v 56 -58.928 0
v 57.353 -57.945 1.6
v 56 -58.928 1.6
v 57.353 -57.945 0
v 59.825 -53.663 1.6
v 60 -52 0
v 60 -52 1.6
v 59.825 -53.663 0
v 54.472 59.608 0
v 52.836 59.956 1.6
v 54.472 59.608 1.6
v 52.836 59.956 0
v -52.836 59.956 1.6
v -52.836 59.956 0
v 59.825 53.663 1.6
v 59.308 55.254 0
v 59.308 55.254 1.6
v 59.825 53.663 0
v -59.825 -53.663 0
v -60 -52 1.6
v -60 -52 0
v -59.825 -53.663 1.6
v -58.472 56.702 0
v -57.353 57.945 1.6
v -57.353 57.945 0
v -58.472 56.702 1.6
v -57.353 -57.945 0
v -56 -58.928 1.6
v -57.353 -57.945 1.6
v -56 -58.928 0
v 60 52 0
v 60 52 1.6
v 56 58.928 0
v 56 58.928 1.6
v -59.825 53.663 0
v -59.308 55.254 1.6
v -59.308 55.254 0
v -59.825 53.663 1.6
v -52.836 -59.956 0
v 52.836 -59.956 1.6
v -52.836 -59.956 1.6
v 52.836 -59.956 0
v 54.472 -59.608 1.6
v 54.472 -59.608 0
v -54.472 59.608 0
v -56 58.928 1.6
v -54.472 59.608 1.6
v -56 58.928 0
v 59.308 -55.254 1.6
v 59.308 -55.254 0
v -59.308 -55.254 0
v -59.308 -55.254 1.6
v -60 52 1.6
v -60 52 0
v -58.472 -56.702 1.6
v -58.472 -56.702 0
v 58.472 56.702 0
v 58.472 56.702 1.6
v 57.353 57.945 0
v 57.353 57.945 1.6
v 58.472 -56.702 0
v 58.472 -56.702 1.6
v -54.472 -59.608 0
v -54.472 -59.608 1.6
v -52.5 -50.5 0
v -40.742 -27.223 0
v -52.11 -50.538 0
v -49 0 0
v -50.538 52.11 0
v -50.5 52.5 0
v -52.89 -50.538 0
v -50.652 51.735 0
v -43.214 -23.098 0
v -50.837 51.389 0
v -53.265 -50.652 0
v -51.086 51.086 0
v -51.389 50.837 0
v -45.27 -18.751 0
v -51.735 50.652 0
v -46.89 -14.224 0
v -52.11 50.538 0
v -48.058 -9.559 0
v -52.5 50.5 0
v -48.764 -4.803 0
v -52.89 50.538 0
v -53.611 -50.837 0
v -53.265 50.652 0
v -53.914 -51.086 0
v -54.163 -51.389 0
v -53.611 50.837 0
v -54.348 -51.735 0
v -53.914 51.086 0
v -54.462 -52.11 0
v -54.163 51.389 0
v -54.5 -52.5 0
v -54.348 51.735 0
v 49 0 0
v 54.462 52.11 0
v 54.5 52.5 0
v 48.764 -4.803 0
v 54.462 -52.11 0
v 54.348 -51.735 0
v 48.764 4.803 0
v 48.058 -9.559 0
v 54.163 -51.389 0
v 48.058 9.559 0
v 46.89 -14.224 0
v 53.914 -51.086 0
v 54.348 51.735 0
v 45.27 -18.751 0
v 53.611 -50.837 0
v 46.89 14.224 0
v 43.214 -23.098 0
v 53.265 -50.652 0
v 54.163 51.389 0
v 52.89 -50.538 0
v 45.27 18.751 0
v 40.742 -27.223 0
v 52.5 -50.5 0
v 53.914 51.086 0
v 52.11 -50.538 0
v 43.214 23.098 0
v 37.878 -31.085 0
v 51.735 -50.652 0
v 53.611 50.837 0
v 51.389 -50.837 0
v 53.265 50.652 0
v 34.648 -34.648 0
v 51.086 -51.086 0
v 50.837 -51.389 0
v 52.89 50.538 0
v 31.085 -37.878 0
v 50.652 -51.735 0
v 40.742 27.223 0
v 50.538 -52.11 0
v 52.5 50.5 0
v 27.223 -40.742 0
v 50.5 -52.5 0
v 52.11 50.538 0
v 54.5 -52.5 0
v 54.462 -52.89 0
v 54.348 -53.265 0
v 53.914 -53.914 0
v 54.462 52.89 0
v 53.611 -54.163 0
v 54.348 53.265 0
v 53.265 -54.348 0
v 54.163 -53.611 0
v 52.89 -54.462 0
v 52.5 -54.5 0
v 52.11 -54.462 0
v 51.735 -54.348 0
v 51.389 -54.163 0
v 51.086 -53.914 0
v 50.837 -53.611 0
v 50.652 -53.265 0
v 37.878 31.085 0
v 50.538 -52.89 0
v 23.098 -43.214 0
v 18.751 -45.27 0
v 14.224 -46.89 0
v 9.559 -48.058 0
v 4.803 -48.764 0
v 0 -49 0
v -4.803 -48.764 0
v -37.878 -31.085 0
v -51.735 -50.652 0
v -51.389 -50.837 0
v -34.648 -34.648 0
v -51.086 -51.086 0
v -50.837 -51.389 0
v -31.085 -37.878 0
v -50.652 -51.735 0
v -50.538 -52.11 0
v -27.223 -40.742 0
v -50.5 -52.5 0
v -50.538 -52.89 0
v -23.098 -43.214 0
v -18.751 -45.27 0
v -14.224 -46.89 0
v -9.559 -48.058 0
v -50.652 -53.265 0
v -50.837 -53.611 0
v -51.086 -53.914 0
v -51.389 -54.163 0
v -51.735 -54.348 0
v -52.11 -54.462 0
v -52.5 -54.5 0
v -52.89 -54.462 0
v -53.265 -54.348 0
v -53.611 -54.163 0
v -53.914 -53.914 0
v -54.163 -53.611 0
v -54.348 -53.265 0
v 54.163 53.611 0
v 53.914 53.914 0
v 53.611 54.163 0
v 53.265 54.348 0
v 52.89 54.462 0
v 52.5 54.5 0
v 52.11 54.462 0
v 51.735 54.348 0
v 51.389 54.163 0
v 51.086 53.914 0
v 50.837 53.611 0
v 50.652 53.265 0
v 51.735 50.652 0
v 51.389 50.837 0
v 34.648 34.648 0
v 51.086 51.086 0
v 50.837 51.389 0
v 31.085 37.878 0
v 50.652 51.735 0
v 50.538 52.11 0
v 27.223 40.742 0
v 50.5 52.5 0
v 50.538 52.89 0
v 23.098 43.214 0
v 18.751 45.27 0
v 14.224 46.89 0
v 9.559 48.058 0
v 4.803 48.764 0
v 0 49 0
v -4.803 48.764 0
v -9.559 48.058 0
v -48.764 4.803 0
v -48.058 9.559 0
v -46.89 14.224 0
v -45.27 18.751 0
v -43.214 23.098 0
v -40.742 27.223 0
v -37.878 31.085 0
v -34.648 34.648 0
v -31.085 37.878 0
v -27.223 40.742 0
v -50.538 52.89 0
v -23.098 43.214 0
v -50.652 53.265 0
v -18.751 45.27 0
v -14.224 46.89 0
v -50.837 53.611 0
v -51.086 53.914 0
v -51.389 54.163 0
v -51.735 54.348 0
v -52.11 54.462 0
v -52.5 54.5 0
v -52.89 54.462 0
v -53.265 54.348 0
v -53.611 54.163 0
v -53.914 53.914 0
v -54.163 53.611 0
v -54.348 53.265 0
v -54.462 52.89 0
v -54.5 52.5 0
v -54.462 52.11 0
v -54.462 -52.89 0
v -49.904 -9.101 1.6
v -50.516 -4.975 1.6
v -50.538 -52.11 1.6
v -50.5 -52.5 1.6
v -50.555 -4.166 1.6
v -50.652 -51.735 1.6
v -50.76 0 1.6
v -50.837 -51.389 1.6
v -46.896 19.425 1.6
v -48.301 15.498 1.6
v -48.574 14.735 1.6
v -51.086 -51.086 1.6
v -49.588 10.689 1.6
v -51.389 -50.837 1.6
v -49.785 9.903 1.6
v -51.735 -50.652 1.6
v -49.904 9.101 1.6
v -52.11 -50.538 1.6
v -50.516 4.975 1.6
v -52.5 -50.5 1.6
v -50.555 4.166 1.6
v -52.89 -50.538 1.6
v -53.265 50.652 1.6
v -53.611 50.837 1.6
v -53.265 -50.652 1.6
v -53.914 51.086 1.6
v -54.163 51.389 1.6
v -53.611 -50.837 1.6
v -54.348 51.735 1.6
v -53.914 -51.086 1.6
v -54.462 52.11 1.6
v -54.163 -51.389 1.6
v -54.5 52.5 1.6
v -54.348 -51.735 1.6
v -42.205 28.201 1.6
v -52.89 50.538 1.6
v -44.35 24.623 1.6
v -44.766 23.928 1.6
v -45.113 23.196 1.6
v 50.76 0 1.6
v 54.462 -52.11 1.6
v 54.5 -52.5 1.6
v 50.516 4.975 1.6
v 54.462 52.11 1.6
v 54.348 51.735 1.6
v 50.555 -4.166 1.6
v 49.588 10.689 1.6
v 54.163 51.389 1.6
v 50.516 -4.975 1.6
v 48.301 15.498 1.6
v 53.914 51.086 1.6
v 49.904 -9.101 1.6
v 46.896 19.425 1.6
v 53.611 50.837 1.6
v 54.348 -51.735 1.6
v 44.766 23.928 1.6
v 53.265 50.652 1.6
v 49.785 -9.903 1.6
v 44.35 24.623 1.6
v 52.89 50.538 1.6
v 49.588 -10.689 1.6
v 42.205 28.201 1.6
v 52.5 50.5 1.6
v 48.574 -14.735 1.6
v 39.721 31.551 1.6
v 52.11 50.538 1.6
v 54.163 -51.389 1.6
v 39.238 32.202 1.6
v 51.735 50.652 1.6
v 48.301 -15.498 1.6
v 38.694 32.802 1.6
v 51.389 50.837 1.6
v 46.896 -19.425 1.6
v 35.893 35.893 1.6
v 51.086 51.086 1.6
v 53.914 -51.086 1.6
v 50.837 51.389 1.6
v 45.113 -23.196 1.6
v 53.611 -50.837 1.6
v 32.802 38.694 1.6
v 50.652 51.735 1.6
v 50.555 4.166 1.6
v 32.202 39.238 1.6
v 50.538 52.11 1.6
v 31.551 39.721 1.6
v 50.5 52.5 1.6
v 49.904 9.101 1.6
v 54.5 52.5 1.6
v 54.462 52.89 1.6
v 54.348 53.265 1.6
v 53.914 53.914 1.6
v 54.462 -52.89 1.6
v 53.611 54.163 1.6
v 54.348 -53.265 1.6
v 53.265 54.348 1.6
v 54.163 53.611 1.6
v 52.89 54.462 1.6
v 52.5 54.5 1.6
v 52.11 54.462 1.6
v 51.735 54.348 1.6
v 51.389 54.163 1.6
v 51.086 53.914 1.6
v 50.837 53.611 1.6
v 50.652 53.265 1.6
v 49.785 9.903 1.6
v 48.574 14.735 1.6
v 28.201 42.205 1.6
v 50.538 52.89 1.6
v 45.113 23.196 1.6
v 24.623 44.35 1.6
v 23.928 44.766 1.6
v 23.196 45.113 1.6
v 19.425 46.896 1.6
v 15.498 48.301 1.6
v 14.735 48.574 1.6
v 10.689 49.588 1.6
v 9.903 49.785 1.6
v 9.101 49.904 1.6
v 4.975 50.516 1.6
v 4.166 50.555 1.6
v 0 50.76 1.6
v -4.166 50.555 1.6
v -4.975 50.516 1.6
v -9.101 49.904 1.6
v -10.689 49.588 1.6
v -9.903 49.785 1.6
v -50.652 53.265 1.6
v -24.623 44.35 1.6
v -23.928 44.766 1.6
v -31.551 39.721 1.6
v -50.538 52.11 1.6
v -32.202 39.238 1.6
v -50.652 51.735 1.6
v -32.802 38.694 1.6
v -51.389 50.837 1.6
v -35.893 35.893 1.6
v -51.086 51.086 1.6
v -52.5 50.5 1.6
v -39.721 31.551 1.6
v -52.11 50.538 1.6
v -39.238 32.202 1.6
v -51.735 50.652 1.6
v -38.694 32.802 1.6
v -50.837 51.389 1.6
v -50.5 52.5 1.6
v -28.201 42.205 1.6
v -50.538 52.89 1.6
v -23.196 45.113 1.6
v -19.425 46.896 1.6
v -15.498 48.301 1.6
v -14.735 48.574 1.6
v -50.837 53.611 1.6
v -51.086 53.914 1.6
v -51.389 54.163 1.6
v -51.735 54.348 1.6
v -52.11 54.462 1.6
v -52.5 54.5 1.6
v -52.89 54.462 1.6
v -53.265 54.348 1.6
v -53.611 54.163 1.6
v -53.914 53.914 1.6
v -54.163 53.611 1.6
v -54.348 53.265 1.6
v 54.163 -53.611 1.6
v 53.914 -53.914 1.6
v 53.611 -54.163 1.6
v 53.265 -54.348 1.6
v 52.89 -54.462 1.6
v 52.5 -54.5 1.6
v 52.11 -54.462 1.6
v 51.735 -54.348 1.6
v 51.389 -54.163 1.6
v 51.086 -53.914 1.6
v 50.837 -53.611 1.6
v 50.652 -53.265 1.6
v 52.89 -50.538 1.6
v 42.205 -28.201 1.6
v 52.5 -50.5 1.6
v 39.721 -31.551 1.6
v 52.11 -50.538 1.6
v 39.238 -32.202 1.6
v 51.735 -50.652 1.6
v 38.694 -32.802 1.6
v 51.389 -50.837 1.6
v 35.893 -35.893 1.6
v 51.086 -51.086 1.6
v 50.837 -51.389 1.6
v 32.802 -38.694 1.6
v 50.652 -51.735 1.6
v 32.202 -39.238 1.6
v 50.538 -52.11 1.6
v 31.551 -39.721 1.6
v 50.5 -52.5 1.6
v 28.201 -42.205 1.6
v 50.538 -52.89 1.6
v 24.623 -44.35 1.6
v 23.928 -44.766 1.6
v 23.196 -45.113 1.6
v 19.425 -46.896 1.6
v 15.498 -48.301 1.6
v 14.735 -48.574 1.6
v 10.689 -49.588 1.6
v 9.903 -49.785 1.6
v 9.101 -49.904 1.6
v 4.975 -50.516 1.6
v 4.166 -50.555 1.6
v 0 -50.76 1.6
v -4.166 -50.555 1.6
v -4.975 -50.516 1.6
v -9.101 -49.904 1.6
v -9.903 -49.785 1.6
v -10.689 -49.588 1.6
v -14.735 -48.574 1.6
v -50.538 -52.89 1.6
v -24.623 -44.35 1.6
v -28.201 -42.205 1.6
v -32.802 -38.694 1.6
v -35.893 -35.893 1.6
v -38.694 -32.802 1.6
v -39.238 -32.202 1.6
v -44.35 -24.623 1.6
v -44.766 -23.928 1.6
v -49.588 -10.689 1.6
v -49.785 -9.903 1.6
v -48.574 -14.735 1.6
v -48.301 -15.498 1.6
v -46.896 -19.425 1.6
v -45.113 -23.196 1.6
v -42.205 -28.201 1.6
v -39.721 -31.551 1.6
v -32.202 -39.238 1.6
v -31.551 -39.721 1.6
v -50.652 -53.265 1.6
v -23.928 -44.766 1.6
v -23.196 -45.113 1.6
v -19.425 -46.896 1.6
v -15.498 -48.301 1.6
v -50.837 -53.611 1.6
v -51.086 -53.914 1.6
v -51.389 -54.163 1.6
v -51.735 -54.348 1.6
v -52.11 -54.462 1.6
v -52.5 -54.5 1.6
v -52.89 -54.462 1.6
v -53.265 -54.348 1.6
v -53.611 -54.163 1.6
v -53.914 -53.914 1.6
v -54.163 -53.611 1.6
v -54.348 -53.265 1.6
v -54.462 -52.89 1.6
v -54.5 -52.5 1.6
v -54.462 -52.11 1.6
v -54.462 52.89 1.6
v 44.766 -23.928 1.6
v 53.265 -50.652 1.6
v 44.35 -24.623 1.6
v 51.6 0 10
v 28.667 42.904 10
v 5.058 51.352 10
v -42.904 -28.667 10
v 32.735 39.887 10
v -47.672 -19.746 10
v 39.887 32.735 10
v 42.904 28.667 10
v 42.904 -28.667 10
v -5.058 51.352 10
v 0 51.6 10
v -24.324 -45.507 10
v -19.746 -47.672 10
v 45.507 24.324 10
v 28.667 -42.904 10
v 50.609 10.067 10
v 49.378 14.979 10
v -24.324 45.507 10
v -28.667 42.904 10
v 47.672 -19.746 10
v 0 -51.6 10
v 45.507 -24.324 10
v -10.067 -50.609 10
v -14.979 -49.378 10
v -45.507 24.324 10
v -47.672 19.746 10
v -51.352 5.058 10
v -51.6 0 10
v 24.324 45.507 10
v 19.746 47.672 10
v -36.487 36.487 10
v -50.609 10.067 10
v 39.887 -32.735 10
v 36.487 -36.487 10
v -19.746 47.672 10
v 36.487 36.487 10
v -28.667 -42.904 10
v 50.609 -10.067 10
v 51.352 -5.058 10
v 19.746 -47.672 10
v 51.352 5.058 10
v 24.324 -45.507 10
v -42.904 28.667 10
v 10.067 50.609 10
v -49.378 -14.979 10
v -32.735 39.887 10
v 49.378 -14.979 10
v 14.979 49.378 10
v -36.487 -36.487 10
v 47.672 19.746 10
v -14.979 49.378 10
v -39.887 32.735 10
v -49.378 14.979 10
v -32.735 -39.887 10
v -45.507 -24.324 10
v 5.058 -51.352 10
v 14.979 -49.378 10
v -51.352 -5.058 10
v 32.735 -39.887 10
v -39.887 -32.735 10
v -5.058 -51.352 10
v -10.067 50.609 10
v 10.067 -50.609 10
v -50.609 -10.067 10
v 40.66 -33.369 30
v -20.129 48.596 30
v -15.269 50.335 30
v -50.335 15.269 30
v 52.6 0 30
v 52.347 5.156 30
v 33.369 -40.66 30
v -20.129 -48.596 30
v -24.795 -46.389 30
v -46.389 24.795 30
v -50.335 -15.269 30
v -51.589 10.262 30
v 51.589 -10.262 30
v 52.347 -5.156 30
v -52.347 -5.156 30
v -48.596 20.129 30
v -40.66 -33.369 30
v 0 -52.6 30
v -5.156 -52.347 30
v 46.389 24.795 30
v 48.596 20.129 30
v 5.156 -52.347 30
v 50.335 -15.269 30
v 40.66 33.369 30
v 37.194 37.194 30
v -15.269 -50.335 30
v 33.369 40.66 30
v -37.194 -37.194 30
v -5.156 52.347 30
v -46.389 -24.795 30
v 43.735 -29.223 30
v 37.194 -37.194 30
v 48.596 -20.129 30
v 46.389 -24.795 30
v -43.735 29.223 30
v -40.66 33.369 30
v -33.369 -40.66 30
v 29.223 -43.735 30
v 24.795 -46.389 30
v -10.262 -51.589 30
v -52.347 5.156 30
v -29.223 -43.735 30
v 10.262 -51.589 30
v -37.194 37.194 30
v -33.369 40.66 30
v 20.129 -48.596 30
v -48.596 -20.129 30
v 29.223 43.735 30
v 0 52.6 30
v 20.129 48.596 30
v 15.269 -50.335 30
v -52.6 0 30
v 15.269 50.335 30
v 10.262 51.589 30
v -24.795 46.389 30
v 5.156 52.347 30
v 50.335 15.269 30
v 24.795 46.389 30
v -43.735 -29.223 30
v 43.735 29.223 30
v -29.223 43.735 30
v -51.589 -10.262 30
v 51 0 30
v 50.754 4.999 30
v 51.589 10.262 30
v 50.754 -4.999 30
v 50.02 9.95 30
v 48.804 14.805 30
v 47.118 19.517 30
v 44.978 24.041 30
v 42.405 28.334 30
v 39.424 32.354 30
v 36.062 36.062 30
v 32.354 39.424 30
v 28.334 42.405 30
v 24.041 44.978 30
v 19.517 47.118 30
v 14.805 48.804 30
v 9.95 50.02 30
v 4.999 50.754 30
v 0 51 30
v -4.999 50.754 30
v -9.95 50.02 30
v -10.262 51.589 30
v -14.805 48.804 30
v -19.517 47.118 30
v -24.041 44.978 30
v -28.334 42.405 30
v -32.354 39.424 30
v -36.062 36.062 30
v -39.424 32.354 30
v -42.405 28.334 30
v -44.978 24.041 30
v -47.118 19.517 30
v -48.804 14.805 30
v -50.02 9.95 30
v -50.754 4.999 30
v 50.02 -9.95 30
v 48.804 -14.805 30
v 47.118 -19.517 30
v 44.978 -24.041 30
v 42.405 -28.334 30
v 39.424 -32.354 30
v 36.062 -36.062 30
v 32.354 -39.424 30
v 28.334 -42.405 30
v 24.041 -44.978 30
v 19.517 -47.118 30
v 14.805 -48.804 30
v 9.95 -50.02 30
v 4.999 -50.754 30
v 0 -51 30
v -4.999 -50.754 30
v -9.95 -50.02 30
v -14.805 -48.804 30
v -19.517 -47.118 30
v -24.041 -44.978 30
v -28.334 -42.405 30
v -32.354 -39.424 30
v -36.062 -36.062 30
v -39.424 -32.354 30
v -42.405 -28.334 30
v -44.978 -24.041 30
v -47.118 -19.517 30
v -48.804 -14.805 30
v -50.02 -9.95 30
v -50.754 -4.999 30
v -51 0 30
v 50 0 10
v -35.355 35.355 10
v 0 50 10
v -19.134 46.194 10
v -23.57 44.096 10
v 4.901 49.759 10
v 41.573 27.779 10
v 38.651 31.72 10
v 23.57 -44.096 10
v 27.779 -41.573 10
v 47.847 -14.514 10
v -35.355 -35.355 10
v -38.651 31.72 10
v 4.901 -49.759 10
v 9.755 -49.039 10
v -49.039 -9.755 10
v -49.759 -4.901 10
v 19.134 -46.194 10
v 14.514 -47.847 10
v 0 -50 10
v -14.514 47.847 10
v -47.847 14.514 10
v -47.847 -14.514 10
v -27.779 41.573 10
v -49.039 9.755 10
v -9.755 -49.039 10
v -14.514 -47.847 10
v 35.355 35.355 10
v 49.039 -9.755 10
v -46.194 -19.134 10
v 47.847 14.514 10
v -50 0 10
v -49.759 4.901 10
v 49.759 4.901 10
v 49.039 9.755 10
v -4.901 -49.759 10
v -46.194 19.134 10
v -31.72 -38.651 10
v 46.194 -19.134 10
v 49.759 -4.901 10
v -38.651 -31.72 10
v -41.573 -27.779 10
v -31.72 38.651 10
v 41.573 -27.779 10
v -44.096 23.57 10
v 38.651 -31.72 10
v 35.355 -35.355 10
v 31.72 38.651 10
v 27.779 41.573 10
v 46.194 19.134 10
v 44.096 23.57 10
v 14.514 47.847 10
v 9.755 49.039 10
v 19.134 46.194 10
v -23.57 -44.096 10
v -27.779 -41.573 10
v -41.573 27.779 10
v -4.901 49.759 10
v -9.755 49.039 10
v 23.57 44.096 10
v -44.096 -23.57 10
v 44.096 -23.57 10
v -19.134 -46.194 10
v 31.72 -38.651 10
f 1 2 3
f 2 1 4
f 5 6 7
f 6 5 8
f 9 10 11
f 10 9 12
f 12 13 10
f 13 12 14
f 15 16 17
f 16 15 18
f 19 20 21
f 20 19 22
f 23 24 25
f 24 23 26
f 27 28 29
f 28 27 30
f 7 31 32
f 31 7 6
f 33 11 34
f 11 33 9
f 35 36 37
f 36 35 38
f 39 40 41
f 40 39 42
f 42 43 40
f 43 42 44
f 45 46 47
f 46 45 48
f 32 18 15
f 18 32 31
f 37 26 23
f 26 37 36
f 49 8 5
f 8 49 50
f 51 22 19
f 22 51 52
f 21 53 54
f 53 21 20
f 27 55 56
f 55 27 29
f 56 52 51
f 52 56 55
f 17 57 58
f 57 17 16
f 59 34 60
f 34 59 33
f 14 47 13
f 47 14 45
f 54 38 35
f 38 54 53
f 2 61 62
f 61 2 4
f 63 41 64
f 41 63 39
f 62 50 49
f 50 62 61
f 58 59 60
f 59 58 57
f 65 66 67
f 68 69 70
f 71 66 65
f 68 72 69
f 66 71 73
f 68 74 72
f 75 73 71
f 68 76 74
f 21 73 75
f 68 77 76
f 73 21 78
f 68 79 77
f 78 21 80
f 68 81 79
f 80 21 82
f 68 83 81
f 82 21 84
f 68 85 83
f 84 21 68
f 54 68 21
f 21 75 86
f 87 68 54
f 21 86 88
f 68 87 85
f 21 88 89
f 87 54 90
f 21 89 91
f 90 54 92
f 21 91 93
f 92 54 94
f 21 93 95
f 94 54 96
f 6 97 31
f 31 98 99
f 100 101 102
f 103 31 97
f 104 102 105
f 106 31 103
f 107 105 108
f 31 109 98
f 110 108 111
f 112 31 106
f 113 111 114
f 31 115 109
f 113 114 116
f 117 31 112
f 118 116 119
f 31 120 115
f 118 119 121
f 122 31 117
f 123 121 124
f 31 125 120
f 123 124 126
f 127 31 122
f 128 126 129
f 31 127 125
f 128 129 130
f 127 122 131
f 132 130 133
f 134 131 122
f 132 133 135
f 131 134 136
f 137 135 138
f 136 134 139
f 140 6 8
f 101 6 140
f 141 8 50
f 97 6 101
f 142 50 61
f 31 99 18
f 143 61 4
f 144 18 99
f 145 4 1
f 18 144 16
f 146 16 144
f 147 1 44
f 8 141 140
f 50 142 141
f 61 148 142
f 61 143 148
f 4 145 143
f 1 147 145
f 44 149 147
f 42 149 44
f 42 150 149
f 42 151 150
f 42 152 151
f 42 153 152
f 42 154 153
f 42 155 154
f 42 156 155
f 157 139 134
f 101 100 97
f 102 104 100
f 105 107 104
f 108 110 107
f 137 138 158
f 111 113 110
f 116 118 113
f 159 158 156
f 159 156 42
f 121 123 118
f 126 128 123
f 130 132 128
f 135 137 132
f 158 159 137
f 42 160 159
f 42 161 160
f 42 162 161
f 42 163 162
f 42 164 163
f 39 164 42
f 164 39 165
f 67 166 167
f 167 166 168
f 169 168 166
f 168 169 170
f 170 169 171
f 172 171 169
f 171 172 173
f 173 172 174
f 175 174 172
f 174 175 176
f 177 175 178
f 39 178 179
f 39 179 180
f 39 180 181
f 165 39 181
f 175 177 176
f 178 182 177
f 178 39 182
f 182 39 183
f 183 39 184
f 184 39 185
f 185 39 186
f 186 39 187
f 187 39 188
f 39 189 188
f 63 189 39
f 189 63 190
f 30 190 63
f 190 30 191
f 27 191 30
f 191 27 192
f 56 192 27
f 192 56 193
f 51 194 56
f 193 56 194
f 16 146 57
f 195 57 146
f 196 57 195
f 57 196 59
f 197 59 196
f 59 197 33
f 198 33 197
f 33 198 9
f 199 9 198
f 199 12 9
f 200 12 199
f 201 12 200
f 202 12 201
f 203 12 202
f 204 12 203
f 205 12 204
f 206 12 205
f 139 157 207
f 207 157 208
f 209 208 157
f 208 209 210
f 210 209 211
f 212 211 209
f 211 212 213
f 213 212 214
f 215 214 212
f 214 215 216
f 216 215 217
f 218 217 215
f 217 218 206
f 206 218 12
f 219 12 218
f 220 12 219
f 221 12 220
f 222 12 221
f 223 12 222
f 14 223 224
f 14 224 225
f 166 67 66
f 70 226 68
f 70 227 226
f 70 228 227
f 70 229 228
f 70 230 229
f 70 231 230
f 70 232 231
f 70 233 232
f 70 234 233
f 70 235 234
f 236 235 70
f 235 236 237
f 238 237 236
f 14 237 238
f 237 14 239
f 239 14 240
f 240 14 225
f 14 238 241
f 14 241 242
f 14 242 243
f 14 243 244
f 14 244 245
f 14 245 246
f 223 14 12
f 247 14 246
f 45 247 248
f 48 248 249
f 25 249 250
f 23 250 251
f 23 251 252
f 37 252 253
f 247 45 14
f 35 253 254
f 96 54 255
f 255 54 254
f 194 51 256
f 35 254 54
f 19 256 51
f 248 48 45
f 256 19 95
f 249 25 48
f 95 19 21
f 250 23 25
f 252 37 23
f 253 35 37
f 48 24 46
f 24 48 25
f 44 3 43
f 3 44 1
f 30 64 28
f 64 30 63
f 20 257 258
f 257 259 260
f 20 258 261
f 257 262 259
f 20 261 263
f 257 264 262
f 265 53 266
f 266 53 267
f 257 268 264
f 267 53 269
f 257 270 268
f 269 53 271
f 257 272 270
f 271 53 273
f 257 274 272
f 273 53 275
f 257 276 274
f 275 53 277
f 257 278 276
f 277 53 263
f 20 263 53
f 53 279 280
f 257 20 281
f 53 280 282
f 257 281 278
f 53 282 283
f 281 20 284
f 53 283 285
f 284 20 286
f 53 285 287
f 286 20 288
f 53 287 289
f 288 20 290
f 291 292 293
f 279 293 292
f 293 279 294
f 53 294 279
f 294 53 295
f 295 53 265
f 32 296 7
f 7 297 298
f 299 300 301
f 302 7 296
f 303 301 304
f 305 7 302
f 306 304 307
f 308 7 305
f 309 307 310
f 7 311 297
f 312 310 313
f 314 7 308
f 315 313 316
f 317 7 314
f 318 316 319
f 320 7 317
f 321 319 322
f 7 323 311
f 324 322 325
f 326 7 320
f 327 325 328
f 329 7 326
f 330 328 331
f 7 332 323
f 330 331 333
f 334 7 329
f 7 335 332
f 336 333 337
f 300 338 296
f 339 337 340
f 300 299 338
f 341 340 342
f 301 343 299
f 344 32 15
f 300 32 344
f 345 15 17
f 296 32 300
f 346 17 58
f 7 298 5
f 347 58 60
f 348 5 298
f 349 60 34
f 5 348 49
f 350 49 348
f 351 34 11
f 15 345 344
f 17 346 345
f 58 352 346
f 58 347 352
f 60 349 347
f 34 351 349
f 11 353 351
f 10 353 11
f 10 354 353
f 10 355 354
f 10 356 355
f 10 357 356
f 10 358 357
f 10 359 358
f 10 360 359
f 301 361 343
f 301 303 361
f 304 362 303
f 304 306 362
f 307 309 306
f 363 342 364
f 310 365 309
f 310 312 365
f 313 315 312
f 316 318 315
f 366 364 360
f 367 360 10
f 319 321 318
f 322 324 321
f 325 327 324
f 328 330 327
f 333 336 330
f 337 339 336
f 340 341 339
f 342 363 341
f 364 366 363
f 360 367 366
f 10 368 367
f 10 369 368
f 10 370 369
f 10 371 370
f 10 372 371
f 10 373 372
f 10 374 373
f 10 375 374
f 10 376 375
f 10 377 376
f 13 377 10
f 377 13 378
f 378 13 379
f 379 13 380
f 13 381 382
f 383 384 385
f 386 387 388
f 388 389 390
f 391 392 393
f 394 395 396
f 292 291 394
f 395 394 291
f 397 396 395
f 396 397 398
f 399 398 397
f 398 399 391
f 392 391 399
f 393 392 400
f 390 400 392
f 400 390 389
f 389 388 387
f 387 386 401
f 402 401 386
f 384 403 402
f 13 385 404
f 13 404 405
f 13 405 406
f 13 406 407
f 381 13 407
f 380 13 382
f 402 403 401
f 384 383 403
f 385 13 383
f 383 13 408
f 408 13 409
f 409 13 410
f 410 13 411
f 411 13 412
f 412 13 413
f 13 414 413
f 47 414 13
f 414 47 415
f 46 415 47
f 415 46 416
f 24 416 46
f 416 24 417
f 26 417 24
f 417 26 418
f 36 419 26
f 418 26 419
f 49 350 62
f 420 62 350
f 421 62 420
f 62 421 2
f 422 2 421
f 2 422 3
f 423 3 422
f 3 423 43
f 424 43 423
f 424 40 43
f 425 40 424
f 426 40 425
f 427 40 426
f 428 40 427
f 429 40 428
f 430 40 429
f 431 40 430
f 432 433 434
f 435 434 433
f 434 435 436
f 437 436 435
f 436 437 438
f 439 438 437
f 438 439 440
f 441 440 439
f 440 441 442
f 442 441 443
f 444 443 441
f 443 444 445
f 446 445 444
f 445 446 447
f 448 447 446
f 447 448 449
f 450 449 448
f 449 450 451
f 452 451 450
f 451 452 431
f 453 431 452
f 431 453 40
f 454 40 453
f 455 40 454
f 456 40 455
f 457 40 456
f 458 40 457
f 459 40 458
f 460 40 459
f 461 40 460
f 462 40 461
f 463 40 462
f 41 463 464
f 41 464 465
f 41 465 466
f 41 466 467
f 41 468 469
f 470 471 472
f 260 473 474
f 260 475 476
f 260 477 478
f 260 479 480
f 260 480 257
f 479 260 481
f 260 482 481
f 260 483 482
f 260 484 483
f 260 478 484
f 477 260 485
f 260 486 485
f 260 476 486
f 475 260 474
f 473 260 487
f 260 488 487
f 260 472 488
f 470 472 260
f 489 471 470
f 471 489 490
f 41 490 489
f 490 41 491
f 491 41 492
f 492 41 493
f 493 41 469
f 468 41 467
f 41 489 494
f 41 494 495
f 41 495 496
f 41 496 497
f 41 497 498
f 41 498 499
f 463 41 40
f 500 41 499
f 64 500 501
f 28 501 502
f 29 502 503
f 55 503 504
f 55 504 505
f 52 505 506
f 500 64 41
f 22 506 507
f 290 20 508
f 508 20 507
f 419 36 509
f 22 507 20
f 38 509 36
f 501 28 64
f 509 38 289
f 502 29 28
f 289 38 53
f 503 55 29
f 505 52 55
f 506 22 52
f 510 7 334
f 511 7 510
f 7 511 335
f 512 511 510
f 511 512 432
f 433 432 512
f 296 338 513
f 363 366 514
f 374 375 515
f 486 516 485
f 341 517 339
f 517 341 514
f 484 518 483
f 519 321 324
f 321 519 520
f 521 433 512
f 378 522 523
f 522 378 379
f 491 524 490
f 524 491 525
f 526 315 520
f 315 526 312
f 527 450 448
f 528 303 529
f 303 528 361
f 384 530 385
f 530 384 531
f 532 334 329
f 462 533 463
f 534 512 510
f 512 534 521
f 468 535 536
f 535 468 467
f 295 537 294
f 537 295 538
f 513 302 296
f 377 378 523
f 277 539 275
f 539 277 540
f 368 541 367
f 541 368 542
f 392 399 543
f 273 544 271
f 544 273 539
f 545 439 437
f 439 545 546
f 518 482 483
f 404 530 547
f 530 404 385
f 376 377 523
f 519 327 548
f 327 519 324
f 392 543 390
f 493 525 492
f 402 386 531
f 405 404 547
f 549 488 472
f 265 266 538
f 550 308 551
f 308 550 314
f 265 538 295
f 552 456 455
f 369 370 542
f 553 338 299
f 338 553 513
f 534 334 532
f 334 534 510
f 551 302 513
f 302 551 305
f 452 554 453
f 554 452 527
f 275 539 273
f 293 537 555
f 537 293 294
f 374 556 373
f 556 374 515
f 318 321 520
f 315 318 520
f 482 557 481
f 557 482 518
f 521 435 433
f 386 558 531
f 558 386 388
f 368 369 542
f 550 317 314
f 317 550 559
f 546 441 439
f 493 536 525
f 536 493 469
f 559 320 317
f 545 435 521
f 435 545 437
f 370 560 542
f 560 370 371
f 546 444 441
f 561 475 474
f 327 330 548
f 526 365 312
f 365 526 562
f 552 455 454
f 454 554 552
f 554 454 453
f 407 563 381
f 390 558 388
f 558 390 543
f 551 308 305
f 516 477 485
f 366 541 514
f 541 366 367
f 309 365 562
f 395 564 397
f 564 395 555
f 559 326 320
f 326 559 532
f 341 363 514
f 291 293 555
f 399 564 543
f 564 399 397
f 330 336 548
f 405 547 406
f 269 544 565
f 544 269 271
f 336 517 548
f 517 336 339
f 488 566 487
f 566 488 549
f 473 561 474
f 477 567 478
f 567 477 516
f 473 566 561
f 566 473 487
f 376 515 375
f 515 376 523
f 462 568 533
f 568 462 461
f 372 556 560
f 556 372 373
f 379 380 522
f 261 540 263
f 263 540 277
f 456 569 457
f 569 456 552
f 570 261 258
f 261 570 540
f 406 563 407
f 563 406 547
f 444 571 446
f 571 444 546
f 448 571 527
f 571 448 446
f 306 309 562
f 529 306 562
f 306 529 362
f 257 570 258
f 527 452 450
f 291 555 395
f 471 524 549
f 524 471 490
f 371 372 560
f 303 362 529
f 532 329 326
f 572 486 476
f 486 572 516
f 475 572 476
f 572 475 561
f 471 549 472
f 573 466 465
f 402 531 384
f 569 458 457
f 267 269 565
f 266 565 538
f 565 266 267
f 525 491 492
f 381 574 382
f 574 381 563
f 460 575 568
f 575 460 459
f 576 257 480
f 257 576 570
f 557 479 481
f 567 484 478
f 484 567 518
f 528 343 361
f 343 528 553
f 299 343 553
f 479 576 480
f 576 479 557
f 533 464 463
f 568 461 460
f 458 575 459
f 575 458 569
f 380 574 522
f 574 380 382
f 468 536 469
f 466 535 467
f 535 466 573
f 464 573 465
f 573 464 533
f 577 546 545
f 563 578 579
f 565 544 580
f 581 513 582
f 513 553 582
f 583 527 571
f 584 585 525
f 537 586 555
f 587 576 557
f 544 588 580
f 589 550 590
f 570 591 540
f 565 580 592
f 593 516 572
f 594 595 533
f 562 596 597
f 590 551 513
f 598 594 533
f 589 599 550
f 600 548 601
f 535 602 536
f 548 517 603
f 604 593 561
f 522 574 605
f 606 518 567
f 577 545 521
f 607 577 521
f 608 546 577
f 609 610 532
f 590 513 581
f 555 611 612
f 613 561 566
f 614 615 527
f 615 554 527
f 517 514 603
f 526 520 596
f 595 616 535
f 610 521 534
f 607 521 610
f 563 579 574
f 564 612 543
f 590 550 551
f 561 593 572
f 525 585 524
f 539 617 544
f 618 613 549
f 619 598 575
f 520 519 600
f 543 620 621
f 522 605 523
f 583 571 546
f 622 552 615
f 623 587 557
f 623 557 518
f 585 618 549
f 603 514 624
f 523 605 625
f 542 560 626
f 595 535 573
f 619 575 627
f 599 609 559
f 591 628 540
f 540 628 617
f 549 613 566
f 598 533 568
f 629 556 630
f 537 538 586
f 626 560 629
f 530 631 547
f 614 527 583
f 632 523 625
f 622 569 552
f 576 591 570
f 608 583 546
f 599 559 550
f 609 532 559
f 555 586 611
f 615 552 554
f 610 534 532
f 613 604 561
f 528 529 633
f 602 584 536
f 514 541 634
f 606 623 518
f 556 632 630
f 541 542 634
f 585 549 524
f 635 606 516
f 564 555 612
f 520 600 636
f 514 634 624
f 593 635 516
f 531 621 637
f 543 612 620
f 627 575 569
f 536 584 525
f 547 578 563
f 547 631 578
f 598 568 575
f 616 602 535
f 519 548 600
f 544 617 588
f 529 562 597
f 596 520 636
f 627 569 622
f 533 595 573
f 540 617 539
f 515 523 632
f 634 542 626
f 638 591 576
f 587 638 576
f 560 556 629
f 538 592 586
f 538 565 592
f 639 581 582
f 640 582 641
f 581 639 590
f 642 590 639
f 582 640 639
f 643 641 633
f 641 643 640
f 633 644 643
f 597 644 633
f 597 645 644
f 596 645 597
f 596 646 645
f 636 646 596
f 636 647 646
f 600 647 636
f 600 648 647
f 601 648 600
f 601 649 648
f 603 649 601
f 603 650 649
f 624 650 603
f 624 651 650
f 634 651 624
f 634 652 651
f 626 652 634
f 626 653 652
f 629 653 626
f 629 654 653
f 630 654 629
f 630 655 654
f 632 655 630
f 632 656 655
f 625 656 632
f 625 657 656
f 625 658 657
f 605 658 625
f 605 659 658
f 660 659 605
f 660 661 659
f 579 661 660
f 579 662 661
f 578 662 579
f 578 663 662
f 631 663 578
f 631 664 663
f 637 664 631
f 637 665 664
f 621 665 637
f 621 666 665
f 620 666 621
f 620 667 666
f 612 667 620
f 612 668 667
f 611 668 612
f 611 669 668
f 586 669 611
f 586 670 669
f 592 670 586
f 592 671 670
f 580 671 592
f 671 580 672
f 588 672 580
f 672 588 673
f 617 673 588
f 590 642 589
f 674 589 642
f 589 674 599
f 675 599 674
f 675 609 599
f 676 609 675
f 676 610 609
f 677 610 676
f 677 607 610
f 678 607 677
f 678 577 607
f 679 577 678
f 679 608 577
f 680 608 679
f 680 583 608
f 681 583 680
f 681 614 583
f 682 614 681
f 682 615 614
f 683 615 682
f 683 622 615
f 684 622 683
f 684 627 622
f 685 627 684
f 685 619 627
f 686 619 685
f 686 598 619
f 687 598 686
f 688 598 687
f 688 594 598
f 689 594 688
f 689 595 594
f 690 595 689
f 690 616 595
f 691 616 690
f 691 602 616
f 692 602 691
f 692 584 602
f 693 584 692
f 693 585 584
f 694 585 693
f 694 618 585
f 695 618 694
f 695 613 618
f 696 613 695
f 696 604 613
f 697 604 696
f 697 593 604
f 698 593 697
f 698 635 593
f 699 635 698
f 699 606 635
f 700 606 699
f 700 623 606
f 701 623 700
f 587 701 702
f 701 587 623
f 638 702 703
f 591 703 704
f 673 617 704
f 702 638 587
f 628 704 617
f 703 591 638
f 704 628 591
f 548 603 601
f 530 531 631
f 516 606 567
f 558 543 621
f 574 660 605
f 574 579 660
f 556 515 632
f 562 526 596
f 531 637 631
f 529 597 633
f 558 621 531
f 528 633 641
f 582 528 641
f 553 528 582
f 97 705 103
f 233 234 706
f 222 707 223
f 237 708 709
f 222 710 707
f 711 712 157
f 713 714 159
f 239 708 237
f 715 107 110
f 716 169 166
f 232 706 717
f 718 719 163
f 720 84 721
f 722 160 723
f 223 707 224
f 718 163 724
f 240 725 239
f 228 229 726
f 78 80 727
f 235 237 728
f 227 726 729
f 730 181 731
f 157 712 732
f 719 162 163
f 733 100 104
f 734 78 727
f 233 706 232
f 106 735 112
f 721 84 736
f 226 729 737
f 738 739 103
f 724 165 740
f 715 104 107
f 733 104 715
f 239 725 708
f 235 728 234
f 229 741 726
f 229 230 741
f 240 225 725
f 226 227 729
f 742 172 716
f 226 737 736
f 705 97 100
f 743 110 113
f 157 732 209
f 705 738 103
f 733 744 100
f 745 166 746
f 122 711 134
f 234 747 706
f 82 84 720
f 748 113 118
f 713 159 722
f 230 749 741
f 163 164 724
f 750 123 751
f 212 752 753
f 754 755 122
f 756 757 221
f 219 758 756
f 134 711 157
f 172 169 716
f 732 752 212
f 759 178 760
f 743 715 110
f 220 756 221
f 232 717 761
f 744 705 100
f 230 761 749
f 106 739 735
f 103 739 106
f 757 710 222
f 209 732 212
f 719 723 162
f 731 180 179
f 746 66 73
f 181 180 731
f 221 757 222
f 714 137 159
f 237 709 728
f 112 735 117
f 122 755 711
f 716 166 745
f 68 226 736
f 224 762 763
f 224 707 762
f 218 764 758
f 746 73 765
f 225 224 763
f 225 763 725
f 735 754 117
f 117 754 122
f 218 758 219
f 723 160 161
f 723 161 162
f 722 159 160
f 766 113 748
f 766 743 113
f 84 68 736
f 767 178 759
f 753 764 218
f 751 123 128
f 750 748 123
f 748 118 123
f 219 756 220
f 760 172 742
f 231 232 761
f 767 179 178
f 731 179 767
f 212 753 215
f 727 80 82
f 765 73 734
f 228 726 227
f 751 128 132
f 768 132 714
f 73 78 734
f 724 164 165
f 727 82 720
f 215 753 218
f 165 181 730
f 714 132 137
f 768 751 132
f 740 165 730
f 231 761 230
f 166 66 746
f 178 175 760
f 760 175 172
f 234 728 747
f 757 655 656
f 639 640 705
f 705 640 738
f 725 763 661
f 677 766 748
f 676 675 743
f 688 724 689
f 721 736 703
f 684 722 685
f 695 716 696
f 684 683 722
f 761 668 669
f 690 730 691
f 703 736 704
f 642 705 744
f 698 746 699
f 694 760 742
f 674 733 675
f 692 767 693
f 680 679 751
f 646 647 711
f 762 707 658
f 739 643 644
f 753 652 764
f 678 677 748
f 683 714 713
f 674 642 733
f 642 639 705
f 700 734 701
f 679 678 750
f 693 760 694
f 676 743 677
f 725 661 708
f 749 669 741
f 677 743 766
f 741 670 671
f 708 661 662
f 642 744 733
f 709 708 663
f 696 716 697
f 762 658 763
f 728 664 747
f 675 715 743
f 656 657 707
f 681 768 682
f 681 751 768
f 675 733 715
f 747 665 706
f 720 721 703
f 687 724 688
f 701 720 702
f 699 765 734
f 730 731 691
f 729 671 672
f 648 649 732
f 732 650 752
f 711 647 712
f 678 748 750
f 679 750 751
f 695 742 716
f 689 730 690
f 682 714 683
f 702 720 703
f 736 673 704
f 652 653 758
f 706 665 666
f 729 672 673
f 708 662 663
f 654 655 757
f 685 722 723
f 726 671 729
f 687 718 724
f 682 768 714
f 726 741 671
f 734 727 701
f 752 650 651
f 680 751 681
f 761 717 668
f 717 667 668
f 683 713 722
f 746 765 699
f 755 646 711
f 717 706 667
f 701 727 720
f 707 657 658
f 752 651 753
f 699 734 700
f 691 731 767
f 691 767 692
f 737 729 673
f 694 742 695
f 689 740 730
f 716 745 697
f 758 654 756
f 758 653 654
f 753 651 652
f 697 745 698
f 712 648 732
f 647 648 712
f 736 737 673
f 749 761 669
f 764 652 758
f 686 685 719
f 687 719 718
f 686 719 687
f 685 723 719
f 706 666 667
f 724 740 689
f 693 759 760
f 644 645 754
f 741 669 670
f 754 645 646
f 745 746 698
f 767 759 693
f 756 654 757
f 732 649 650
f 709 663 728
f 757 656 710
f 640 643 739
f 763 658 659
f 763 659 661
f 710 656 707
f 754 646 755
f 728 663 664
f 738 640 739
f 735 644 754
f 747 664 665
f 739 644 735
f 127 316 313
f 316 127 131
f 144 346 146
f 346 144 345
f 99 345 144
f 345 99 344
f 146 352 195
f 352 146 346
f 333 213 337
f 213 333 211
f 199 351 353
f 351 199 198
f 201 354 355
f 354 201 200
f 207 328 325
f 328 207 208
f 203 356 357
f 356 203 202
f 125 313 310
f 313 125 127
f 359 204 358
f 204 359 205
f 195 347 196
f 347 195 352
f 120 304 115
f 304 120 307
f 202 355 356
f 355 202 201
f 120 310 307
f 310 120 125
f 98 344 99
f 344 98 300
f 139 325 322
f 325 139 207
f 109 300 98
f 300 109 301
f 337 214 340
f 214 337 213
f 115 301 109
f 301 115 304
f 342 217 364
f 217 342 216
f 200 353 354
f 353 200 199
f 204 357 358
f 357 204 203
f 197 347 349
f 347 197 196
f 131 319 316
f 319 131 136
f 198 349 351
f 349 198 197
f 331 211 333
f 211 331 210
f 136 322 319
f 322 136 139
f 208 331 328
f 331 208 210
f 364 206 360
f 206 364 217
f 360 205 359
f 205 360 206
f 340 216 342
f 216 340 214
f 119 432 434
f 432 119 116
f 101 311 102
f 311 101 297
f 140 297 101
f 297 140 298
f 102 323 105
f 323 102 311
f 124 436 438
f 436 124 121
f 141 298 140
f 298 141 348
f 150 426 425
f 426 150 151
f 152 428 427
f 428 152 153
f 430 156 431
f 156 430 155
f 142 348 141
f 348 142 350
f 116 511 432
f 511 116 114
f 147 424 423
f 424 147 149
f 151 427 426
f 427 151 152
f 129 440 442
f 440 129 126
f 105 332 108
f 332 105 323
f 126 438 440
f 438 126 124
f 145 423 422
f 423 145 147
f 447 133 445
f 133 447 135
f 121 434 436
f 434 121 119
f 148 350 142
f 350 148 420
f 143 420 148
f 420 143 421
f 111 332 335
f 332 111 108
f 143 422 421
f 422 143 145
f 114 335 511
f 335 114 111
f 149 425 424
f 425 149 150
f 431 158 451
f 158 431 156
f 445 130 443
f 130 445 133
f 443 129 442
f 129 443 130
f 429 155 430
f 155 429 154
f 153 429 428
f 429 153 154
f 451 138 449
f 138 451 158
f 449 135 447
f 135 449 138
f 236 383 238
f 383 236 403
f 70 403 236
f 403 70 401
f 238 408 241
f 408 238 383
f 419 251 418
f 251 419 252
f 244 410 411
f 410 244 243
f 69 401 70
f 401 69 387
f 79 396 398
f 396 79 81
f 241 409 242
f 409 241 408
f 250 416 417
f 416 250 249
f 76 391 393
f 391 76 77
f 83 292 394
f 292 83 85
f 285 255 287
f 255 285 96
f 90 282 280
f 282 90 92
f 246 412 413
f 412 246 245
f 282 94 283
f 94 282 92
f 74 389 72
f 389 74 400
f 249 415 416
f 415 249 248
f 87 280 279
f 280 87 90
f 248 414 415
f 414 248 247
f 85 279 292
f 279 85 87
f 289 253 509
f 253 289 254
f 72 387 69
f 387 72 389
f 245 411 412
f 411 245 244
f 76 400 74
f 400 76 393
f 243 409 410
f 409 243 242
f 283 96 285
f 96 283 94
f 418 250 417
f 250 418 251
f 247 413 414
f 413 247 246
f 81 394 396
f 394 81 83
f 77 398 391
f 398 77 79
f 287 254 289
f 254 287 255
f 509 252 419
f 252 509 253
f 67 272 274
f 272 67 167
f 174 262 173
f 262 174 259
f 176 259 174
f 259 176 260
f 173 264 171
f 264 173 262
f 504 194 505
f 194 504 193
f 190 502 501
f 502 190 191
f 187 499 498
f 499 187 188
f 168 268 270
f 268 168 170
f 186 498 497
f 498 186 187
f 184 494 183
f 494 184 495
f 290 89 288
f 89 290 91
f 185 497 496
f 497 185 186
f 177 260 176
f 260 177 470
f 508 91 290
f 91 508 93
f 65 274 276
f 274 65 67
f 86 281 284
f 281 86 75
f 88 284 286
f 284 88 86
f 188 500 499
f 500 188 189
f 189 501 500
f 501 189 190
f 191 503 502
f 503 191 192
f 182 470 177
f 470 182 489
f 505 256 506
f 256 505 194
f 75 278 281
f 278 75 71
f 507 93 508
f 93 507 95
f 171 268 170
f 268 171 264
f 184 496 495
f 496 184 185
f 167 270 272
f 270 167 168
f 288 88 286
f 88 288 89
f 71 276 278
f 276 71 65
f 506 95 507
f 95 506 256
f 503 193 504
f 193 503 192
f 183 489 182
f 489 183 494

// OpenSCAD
screw_d = 105;

screw_hole = 4;
wall = 0.8*2;
begin_d = 98+wall*2;
end_d = 100+wall*2;
end2_d = 102+wall*2;


h_1 = 10;
h_2 = 20;
fn = 64;

module roundedcube(xdim ,ydim ,zdim,rdim){
    hull(){
        fn=30;
        translate([rdim,rdim,0]) cylinder(r=rdim, h=zdim, $fn=fn);
        translate([xdim-rdim,rdim,0])cylinder(r=rdim, h=zdim, $fn=fn);

        translate([rdim,ydim-rdim,0]) cylinder(r=rdim, h=zdim, $fn=fn);
        translate([xdim-rdim,ydim-rdim,0]) cylinder(r=rdim, h=zdim, $fn=fn);
    }
}


difference() {
    union() {
        translate([-60,-60,0]) roundedcube(120,120,0.8*2,8);
        cylinder(d1=begin_d, d2=end_d, h=h_1, $fn = fn);
        
        translate([0,0,h_1]) cylinder(d1=end_d, d2=end2_d, h = h_2, $fn = fn);
    }
    cylinder(d1=begin_d-wall*2, d2=end_d-wall*2, h=h_1, $fn = fn);
    
    translate([0,0,h_1]) cylinder(d1=end_d-wall*2, d2=end2_d-wall*2, h = h_2, $fn = fn);
    //screw holes
    translate([screw_d/2, screw_d/2,-1]) cylinder(d=screw_hole, h = wall*2, $fn = 32);
    translate([screw_d/2, -screw_d/2, -1]) cylinder(d=screw_hole, h = wall*2, $fn = 32);
    translate([-screw_d/2, screw_d/2,-1]) cylinder(d=screw_hole, h = wall*2, $fn = 32);
    translate([-screw_d/2, -screw_d/2,-1]) cylinder(d=screw_hole, h = wall*2, $fn = 32);
    
}
